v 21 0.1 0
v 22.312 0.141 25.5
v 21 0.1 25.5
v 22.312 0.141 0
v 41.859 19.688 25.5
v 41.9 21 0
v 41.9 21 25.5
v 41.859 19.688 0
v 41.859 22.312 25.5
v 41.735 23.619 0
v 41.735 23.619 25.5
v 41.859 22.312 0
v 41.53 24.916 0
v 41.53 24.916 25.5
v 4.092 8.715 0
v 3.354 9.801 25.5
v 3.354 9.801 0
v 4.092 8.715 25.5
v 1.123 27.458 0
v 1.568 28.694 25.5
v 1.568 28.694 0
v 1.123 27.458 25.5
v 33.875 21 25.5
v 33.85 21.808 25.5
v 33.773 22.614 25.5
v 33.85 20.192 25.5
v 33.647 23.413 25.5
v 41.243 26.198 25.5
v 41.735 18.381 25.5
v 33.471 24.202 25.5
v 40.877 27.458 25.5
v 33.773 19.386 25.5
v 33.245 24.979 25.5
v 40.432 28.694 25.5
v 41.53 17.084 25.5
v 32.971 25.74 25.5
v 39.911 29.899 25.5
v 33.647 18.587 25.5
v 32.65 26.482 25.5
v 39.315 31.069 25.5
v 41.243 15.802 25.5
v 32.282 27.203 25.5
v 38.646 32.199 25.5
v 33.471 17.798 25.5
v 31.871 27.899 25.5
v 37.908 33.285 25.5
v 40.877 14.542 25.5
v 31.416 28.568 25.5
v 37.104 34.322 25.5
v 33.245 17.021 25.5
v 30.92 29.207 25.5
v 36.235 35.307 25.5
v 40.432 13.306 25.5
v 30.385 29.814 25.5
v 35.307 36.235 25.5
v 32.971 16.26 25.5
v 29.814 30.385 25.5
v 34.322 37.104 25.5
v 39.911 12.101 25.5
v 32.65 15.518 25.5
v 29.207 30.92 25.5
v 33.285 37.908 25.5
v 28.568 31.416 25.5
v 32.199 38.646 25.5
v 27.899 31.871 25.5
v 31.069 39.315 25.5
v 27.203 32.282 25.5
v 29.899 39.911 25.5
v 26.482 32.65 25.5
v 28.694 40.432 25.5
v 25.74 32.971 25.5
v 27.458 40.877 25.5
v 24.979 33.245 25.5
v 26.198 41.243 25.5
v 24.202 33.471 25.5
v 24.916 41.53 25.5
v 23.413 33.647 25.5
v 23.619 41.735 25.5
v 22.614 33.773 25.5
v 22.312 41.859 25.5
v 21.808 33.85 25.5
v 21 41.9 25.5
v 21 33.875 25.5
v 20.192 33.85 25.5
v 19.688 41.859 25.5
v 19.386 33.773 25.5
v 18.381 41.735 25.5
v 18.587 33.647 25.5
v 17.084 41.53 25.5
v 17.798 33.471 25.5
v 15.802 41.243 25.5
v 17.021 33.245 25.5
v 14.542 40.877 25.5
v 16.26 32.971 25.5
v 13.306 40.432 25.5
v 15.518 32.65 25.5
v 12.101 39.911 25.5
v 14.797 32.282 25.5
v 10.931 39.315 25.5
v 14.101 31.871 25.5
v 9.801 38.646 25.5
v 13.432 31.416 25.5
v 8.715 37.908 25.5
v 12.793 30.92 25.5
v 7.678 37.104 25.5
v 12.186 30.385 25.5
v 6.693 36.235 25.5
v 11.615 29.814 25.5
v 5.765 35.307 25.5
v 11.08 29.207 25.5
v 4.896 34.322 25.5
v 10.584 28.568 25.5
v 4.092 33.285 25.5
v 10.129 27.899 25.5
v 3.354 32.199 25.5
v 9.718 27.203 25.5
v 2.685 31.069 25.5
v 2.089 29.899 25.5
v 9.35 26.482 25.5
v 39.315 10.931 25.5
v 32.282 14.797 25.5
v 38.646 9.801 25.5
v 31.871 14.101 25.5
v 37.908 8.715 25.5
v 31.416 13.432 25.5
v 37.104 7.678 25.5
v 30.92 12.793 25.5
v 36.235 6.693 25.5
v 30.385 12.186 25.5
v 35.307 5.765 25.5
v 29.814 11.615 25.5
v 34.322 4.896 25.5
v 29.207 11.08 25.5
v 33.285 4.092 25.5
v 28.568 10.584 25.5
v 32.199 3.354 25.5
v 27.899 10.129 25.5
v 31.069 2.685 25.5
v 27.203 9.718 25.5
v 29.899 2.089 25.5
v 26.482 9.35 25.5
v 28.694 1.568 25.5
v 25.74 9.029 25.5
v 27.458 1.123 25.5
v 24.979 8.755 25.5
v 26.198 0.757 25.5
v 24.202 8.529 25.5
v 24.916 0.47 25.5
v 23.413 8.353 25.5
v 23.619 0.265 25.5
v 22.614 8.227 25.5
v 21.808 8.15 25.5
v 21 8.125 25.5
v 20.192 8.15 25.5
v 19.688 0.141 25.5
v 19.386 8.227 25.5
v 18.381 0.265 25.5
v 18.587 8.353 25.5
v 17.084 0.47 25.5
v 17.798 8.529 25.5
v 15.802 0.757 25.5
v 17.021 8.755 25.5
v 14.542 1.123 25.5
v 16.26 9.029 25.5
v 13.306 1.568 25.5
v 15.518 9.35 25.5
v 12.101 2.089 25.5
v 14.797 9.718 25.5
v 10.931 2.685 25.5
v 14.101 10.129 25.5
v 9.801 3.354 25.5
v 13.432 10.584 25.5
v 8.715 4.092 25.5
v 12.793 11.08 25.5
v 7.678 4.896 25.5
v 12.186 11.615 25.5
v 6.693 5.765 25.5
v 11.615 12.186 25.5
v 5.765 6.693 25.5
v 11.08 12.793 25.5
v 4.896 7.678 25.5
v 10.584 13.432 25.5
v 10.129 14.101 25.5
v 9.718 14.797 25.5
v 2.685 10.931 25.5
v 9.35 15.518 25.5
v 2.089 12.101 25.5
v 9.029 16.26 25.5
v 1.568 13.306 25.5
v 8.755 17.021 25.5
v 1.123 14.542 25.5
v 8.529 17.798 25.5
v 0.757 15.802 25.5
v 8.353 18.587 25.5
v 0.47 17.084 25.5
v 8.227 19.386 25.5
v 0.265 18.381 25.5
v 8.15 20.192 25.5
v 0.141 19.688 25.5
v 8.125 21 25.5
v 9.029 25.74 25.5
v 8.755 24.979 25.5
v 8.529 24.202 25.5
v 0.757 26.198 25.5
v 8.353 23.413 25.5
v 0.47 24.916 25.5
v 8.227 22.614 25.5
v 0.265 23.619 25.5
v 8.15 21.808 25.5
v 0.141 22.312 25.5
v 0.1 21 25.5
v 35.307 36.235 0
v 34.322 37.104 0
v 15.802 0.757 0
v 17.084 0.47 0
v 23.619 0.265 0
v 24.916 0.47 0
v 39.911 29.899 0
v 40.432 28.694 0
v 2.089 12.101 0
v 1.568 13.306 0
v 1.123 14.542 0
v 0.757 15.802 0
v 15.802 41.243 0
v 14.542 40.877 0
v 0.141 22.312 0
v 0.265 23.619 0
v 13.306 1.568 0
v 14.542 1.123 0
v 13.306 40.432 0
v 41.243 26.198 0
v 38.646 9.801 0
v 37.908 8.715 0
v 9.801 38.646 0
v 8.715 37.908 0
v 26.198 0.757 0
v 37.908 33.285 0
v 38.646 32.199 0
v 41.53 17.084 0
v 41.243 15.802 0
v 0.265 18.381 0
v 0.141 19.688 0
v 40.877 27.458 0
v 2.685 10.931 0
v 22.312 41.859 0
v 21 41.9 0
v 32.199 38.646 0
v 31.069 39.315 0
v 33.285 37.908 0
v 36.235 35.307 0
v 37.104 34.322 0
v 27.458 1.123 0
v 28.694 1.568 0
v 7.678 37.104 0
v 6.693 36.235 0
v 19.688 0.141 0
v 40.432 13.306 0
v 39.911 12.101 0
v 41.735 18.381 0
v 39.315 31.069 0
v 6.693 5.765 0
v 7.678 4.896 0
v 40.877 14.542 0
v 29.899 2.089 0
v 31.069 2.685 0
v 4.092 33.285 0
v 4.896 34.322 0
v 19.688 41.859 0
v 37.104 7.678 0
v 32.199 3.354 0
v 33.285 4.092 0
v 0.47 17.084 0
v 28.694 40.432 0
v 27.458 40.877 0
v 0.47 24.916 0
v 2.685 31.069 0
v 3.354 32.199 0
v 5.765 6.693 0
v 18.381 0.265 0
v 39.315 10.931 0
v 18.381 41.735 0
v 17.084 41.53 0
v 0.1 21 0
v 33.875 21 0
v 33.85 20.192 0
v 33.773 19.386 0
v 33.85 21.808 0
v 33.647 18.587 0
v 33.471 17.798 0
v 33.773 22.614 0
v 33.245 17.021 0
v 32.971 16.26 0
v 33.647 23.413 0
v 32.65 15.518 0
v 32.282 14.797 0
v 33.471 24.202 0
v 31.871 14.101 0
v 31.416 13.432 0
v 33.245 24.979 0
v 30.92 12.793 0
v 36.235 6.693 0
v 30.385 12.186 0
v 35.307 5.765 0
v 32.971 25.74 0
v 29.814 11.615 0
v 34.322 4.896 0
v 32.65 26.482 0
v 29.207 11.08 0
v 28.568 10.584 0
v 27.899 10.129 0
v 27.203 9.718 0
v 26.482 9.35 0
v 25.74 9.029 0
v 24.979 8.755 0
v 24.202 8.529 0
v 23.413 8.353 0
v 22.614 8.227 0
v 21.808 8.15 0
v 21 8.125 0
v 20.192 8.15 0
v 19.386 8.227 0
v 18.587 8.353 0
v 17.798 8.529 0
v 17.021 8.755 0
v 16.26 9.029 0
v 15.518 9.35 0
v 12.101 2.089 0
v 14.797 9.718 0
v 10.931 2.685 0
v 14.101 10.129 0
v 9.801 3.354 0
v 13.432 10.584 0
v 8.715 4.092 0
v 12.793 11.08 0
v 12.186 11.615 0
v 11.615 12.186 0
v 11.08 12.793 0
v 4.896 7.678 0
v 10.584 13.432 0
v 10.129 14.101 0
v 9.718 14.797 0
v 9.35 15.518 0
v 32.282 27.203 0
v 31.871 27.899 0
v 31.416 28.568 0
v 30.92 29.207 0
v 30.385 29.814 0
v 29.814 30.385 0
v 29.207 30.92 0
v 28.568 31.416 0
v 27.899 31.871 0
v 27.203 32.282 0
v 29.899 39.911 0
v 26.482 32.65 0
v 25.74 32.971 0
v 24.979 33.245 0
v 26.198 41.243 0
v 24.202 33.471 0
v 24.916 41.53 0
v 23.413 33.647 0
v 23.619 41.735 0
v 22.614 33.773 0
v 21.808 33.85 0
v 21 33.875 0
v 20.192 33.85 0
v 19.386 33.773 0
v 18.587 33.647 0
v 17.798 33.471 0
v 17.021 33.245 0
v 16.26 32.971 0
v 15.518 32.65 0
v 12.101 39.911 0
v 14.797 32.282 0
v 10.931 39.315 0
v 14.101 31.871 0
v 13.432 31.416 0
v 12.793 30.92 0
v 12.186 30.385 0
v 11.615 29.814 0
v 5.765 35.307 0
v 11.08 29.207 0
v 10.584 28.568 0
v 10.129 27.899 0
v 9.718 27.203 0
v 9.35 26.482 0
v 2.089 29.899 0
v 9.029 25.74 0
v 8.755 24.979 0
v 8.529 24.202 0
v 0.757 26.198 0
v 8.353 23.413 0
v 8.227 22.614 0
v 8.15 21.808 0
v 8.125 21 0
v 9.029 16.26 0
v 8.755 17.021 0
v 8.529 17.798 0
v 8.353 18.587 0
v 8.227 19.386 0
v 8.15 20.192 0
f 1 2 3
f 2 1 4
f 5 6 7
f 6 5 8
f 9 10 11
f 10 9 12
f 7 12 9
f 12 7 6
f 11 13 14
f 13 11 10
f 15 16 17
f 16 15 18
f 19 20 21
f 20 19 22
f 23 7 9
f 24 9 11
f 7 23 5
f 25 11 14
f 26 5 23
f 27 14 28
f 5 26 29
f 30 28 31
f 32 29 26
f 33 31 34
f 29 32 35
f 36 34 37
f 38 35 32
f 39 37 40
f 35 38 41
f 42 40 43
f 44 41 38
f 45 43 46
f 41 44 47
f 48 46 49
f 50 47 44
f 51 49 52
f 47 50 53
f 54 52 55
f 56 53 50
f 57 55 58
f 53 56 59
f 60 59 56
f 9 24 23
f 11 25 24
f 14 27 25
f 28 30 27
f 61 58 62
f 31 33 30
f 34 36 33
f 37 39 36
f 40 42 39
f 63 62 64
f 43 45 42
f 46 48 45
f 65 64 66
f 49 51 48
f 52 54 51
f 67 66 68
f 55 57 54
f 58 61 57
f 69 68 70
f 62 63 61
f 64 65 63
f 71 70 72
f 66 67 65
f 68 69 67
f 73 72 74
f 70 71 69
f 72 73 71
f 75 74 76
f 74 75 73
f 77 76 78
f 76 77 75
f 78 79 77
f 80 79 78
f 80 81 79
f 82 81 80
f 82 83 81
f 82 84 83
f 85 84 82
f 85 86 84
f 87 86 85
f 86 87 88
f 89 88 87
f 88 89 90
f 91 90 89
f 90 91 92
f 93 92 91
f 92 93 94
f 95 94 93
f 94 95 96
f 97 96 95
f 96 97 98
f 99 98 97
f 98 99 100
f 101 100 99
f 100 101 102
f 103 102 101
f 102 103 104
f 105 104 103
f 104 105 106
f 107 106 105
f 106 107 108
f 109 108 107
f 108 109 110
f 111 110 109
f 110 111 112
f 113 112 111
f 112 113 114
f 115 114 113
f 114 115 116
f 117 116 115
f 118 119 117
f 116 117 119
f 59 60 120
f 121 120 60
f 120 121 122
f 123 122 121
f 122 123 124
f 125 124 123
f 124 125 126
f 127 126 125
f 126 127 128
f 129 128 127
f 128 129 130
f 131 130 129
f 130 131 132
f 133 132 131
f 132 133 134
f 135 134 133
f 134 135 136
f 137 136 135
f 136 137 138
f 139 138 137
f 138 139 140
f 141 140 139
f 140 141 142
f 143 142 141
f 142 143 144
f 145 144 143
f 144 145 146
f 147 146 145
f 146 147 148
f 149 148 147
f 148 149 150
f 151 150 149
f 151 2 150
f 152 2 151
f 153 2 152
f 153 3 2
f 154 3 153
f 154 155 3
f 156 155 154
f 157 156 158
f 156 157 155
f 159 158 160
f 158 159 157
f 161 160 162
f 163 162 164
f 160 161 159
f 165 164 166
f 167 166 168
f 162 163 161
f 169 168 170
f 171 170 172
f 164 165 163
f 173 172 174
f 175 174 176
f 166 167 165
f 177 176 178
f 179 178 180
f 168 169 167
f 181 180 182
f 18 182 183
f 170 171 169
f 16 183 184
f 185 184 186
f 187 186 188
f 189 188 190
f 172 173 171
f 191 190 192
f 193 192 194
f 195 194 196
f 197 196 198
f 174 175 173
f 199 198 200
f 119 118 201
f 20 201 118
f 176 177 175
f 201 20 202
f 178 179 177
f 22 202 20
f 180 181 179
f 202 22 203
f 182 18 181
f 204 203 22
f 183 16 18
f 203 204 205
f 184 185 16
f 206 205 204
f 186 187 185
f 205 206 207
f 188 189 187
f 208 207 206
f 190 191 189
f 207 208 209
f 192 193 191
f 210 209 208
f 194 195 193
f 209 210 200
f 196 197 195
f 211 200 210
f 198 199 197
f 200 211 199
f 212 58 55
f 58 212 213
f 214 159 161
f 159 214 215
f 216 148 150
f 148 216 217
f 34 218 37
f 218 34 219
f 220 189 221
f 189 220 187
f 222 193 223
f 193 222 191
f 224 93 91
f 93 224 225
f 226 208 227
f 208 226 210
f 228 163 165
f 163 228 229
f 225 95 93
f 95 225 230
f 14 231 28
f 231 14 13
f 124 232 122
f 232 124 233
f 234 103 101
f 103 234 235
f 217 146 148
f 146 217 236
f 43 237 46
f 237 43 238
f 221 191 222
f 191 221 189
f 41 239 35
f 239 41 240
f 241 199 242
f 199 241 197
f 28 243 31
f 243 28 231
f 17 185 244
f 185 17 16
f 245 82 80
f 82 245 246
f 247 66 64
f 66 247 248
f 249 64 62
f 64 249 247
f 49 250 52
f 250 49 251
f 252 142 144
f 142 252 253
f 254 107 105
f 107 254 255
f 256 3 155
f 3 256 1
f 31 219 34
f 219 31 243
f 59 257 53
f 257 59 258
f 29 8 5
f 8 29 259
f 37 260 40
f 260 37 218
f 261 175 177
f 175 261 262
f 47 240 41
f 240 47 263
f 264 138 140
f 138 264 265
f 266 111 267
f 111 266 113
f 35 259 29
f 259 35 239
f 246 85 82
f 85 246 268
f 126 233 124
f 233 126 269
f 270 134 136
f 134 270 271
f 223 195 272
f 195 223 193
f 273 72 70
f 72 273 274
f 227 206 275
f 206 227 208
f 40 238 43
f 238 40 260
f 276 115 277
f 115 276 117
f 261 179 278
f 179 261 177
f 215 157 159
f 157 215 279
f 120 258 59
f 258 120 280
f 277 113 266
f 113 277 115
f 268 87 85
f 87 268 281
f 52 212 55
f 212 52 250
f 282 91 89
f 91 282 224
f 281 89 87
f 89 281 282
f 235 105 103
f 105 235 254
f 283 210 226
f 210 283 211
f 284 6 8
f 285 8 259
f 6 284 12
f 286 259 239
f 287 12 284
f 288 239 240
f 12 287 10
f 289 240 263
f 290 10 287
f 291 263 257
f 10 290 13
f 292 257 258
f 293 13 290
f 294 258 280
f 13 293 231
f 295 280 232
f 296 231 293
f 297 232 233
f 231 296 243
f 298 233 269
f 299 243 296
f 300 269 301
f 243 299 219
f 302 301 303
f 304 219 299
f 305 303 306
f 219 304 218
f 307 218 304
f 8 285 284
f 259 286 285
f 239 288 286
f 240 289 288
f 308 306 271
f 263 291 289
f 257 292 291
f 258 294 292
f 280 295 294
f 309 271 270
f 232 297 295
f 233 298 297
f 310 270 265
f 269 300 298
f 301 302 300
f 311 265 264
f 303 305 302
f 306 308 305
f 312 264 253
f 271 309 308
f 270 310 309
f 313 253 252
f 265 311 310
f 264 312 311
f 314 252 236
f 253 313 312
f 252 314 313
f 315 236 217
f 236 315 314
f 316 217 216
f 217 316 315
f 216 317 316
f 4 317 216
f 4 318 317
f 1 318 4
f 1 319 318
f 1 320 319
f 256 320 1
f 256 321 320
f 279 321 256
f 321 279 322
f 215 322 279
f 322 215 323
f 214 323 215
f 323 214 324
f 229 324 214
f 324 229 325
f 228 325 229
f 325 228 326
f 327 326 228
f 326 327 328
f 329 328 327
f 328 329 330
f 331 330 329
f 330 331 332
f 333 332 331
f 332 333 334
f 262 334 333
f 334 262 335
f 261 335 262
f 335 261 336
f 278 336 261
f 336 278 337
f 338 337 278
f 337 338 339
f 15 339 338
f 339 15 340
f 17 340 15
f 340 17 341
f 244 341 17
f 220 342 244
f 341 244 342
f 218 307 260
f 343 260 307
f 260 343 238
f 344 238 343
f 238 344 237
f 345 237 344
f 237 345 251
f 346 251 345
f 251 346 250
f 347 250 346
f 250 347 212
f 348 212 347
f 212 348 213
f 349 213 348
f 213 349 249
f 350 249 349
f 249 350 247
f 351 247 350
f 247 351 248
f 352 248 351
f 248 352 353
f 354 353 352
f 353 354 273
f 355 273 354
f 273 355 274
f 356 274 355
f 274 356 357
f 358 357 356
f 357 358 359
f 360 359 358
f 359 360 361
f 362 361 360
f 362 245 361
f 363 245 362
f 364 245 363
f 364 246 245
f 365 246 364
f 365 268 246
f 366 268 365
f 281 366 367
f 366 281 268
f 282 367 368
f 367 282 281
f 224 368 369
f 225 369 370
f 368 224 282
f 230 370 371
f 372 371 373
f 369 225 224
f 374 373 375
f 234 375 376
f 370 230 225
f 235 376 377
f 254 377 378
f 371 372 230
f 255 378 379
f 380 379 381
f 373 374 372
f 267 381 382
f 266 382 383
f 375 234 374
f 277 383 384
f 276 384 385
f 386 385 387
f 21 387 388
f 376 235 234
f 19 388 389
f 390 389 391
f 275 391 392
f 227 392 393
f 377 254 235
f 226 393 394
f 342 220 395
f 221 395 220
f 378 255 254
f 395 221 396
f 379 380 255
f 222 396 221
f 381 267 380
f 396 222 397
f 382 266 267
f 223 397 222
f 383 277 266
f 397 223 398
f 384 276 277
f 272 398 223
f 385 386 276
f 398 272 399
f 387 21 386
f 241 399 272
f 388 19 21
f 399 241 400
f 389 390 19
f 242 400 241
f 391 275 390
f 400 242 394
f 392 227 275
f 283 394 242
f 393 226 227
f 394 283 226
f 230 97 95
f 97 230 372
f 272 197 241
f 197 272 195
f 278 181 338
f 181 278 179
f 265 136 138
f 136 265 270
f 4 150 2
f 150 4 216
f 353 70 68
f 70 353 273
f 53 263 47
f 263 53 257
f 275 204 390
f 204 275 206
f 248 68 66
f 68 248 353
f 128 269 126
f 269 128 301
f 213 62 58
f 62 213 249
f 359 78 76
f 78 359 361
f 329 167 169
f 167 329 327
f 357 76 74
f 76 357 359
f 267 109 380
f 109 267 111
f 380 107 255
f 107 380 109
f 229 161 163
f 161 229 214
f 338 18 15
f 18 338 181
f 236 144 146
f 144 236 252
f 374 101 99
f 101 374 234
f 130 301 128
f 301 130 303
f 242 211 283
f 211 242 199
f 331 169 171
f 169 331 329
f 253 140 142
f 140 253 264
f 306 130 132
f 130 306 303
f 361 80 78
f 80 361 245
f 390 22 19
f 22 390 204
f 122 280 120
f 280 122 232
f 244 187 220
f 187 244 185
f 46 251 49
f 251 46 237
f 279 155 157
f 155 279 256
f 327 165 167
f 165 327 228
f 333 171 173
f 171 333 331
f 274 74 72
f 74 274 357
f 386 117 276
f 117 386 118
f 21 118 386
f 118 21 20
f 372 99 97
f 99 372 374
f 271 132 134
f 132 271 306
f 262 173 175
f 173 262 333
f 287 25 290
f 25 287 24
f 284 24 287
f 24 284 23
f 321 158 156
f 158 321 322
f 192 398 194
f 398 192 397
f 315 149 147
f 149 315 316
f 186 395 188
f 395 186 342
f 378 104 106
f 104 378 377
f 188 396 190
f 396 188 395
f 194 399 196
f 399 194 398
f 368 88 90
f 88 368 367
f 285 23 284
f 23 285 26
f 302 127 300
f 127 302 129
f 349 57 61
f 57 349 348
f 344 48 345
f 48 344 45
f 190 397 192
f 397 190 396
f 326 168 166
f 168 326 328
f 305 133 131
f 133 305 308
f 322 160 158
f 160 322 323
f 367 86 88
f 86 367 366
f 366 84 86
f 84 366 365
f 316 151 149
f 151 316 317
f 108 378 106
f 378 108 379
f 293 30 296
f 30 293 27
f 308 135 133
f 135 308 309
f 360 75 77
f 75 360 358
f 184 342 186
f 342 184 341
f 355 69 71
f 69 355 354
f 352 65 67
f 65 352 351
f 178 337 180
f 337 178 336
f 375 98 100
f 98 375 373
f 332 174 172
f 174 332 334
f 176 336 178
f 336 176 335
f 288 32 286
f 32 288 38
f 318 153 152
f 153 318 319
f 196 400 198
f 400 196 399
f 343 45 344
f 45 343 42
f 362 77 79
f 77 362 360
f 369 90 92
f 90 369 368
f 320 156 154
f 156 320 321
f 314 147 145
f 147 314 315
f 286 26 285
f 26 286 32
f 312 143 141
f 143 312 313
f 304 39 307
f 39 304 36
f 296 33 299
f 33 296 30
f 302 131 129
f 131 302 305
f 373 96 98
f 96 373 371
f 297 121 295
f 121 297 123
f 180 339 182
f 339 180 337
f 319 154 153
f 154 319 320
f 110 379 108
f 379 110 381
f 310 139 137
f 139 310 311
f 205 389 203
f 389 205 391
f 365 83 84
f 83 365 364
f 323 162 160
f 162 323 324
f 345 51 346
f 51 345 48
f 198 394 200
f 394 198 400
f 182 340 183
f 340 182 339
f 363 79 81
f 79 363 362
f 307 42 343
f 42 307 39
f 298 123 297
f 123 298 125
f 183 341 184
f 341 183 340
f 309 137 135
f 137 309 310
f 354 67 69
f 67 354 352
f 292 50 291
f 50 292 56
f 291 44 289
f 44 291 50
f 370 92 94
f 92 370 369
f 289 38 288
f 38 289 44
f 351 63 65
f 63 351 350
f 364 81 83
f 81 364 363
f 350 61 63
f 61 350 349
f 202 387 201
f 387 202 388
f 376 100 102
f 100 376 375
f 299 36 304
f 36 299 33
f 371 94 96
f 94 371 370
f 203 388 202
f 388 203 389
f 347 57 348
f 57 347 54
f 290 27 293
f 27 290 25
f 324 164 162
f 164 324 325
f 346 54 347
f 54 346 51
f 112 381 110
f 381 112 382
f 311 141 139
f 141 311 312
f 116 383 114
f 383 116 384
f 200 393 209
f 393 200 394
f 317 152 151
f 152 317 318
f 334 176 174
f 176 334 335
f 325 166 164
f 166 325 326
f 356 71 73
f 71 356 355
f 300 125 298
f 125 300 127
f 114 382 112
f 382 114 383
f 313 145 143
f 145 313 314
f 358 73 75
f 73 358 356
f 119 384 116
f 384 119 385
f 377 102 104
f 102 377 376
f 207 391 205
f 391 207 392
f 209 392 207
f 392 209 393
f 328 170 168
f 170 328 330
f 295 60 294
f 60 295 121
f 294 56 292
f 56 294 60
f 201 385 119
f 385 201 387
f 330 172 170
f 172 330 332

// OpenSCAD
module ring1() {
		// Part 3, ring 1

		translate([21, 21, 0])
		difference() {
			cylinder(h = 25.5, r = 20.9, $fn = 100);
			cylinder(h = 25.5, r = 12.875, $fn = 100);
		}
}

module funnel_tip() {
	union() {

		// Part 1, funnel

		// diameter 32.8 (radius , place (x.y) such that there is 1mm margin
		translate([17.4, 17.4, 0])
		union() {
			difference() { 	
				cylinder(h = 12.8, r1 = 16.4, r2 = 8.95, $fn = 100);		
				cylinder(h = 8.7, r1 = 15.4, r2 = 6.75, $fn = 100);
				translate([0, 0, 8.7])
				cylinder(h = 7.5, r = 6.75, $fn = 100);
			}
			translate([0, 0, 12.8])
			difference() { 
				cylinder(h = 50.7, r = 8.95, $fn = 100);		
				cylinder(h = 50.7, r = 6.75, $fn = 100);
			}
		}


		// Part 2, funnel tip


		/* Notes on placing grooves 
		Base shape (cube + cylinder) is dislocated based on largest radius minus width of cube.
		*/

		// max radius 41.8, place (x.y) such that there is 1mm margin
		// between all elements

		difference() {
			translate([55.7, 21.9, 0])
			union() {
			//base
				difference() {
					cylinder(h = 11.6, r1 = 16.3, r2 = 20.9, $fn = 100); // r1 = 32.6, r2 = 41.8
					cylinder(h = 11.6, r1 = 15.3, r2 = 9, $fn = 100); // r1 = 30.6, r2 = 18
				}
				translate([0, 0, 11.6])
				difference() {
					cylinder(h = 15, r = 20.9, $fn = 100);
					cylinder(h = 15, r = 9, $fn = 100);
				}
				translate([0, 0, 26.6])
				difference() {
					cylinder(h = 10, r = 12.875, $fn = 100);
					cylinder(h = 10, r = 9, $fn = 100);
				}
			}

			translate([55.7, 21.9, 19.6])
			difference() {
				cylinder(h=3.5, r = 20.9, $fn = 100);
				cylinder(h=3.5, r1 = 18.5, r2 = 20.9, $fn = 100);
			}

			// 1st groove, S
			translate([55.7, 2.15,0])
			union() {
				translate([0, 0, 20.8])	  
				rotate ([90,0,0]) cylinder 
				(h = 2.3, r=2.25, center = true, $fn = 100);
				translate([0, 0, 10.4])	  
				cube([4.5, 2.3, 20.8], center = true, $fn = 100);
			}

			// 2nd groove, N
			// translate([55.7, 2.15,0]) // 2.15 + 39.5 = 41.65
			translate([55.7, 41.65,0]) 
			union() {
				translate([0, 0, 20.8])	  
				rotate ([90,0,0]) cylinder 
				(h = 2.3, r=2.25, center = true, $fn = 100);
				translate([0, 0, 10.4])	  
				cube([4.5, 2.3, 20.8], center = true, $fn = 100);
			}

			// 3rd groove, SW
			translate([38.596, 12.025,0]) 
			union() {
				translate([0, 0, 20.8])	  
				rotate ([90,0,120]) cylinder (h = 2.3, r=2.25, center = true, $fn = 100);

				translate([0, 0, 10.4])	
				rotate ([0,0,120])   
				cube([4.5, 2.3, 20.8], center = true, $fn = 100);
			}

			// wire groove, between S and SW groove
			translate([45.825, 4.796,0]) 
			union() {
				translate([0, 0, 20.8])	  
				rotate ([90,0,150]) cylinder (h = 2.3, r=2.25, center = true, $fn = 100);

				translate([0, 0, 10.4])	
				rotate ([0,0,150])   
				cube([4.5, 2.3, 20.8], center = true, $fn = 100);
			}

			// 4th groove, NE
			translate([72.804, 31.775,0]) 
			union() {
				translate([0, 0, 20.8])	  
				rotate ([90,0,120]) cylinder (h = 2.3, r=2.25, center = true, $fn = 100);

				translate([0, 0, 10.4])	
				rotate ([0,0,120])   
				cube([4.5, 2.3, 20.8], center = true, $fn = 100);
			}

			// 5th groove, SE
			translate([72.804, 12.025,0]) 
			union() {
				translate([0, 0, 20.8])	  
				rotate ([90,0,60]) cylinder (h = 2.3, r=2.25, center = true, $fn = 100);

				translate([0, 0, 10.4])	
				rotate ([0,0,60])   
				cube([4.5, 2.3, 20.8], center = true, $fn = 100);
			}

			// 6th groove, SE
			translate([38.596, 31.775,0]) 
			union() {
				translate([0, 0, 20.8])	  
				rotate ([90,0,60]) cylinder (h = 2.3, r=2.25, center = true, $fn = 100);

				translate([0, 0, 10.4])	
				rotate ([0,0,60])   
				cube([4.5, 2.3, 20.8], center = true, $fn = 100);
			}
		}


		// Part 3, ring 1

		translate([21.9, 55.7, 0])
		difference() {
			cylinder(h = 25.5, r = 20.9, $fn = 100);
			cylinder(h = 25.5, r = 12.875, $fn = 100);
		}

		// Part 4, ring 2

		translate([55.95, 55.95, 0])
		difference() {
			cylinder(h = 5, r = 12.15, $fn = 100);
			cylinder(h = 5, r = 8.3, $fn = 100);
		}
	}
}

// funnel_tip();

ring1();
